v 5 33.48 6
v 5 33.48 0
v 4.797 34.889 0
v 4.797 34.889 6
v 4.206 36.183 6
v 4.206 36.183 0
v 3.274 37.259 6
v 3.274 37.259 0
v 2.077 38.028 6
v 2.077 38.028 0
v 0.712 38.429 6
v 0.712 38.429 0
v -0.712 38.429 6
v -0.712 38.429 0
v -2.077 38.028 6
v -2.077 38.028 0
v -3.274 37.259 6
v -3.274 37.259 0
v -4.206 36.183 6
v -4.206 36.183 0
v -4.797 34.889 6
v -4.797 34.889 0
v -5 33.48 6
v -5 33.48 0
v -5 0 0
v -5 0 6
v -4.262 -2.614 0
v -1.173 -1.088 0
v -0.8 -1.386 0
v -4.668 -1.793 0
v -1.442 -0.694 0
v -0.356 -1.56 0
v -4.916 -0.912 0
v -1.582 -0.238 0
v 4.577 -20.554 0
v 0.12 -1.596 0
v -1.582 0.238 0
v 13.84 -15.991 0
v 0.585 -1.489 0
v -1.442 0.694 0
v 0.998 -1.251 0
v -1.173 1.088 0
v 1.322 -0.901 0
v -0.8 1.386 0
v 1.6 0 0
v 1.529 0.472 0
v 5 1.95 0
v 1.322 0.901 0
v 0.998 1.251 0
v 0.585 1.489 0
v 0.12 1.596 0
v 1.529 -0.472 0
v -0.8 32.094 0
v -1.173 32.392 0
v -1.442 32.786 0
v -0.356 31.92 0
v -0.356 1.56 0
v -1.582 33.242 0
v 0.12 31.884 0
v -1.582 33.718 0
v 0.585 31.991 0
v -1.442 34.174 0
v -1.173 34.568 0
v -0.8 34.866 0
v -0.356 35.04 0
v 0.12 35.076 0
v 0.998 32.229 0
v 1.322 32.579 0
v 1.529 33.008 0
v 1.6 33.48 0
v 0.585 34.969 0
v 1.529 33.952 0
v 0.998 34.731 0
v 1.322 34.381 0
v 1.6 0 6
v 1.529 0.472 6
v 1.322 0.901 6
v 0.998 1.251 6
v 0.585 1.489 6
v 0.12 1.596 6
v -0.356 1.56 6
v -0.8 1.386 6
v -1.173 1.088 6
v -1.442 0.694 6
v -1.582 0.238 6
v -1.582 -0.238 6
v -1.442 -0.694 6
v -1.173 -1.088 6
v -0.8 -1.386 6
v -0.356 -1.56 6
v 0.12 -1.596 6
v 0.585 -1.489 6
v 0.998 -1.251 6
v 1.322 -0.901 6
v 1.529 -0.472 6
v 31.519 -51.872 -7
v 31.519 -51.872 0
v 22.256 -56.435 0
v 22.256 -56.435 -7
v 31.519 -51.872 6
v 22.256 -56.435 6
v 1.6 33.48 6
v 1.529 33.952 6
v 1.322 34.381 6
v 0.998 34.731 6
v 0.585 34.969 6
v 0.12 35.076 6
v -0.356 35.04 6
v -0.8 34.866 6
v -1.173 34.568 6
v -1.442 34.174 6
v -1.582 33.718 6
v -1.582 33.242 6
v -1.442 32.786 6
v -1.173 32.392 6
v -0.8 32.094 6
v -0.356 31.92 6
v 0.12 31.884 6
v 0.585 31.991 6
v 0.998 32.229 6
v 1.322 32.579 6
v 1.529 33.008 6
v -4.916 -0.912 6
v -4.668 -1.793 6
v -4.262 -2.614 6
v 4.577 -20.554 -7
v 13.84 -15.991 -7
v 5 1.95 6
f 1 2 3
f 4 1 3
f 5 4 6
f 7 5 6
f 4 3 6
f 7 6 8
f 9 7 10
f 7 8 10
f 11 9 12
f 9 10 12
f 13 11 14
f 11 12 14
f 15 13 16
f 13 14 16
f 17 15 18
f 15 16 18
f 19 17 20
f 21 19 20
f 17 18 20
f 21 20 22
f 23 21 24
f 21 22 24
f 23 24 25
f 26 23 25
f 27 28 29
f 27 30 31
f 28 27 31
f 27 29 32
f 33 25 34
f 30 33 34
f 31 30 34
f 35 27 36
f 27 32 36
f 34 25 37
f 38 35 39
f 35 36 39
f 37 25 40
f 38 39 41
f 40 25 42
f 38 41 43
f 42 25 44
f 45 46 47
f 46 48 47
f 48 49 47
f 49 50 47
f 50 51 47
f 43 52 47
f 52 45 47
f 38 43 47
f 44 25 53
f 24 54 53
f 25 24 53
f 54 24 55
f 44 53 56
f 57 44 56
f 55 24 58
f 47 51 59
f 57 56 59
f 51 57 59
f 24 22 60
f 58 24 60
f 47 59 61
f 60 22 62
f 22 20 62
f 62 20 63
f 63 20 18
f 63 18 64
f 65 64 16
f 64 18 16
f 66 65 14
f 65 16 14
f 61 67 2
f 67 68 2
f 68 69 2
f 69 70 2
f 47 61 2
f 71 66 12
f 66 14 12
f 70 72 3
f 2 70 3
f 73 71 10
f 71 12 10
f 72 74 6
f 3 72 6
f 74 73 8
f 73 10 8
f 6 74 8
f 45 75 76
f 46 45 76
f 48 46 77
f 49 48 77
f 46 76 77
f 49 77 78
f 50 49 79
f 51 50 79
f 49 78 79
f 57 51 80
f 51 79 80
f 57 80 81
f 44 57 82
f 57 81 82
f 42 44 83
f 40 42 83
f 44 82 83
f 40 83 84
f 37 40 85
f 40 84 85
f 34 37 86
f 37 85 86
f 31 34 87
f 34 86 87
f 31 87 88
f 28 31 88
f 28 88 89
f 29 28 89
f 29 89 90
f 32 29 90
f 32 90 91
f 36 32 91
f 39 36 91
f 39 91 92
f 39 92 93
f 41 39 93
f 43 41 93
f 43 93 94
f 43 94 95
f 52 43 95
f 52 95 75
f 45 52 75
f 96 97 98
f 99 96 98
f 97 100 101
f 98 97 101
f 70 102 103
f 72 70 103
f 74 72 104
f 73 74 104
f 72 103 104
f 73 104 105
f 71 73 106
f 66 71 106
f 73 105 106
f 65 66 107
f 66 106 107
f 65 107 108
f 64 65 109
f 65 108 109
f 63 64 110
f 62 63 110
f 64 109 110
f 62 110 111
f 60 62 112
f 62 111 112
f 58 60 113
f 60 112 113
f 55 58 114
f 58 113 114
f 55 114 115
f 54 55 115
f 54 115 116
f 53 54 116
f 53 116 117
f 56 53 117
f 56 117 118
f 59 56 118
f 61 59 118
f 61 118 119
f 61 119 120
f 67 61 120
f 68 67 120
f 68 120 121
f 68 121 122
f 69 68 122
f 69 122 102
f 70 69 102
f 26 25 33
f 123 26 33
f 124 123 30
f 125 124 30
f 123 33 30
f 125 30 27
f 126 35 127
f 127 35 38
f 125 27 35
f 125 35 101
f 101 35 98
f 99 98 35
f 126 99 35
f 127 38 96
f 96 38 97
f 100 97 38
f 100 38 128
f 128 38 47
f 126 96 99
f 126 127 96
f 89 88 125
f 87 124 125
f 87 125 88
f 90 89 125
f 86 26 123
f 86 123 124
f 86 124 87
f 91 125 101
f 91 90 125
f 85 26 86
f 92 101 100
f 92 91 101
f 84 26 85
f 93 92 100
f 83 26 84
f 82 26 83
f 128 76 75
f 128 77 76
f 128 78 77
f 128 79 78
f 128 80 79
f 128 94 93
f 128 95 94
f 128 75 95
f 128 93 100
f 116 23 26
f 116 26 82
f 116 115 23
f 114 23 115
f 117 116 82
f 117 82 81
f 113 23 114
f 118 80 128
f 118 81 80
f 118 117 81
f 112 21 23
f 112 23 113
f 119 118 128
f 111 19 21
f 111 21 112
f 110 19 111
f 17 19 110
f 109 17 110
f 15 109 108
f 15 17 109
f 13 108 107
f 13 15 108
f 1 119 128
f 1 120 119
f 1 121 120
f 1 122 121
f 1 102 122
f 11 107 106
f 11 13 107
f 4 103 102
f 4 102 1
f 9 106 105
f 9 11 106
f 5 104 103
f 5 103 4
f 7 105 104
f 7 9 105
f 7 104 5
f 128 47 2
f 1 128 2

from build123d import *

# Parameters (mm, degrees)
SALIENTE_EXTRUIR1_DEPTH = 6
CROQUIS2_R              = 1.6
CORTAR_EXTRUIR1_DEPTH   = 65.918146911
SALIENTE_EXTRUIR2_DEPTH = 7


with BuildPart() as part:
    # Croquis1 → Saliente-Extruir1 (new body)
    with BuildSketch(Plane.XY):
        with BuildLine():
            Line((-5, 33.48), (-5, 0))
            ThreePointArc((-5, 0), (0, -5), (5, 0))
            Line((5, 0), (5, 33.48))
            ThreePointArc((5, 33.48), (0, 38.48), (-5, 33.48))
        make_face()
        with BuildLine():
            ThreePointArc((5, 0), (1.357892891, -4.812081348), (-4.262450759, -2.613716421))
            Line((-4.262450759, -2.613716421), (22.256084979, -56.435340907))
            Line((22.256084979, -56.435340907), (31.518535738, -51.871624486))
            Line((31.518535738, -51.871624486), (5, 1.95))
            Line((5, 1.95), (5, 0))
        make_face()
    extrude(amount=SALIENTE_EXTRUIR1_DEPTH)

    # Croquis2 → Cortar-Extruir1 (cut, through all)
    with BuildSketch(Plane.XY.offset(6)):
        with Locations((0, 33.48)):
            Circle(CROQUIS2_R)
        Circle(CROQUIS2_R)
    extrude(amount=-CORTAR_EXTRUIR1_DEPTH, mode=Mode.SUBTRACT)

    # Croquis3 → Saliente-Extruir2 (add)
    with BuildSketch(Plane(origin=(0, 0, 0), x_dir=(-1, 0, 0), z_dir=(0, 0, -1))):
        Polygon((-31.518535738, -51.871624486), (-22.256084979, -56.435340907), (-4.577061154, -20.554257916), (-13.839511913, -15.990541495), align=None)
    extrude(amount=SALIENTE_EXTRUIR2_DEPTH)


solid = part.part
